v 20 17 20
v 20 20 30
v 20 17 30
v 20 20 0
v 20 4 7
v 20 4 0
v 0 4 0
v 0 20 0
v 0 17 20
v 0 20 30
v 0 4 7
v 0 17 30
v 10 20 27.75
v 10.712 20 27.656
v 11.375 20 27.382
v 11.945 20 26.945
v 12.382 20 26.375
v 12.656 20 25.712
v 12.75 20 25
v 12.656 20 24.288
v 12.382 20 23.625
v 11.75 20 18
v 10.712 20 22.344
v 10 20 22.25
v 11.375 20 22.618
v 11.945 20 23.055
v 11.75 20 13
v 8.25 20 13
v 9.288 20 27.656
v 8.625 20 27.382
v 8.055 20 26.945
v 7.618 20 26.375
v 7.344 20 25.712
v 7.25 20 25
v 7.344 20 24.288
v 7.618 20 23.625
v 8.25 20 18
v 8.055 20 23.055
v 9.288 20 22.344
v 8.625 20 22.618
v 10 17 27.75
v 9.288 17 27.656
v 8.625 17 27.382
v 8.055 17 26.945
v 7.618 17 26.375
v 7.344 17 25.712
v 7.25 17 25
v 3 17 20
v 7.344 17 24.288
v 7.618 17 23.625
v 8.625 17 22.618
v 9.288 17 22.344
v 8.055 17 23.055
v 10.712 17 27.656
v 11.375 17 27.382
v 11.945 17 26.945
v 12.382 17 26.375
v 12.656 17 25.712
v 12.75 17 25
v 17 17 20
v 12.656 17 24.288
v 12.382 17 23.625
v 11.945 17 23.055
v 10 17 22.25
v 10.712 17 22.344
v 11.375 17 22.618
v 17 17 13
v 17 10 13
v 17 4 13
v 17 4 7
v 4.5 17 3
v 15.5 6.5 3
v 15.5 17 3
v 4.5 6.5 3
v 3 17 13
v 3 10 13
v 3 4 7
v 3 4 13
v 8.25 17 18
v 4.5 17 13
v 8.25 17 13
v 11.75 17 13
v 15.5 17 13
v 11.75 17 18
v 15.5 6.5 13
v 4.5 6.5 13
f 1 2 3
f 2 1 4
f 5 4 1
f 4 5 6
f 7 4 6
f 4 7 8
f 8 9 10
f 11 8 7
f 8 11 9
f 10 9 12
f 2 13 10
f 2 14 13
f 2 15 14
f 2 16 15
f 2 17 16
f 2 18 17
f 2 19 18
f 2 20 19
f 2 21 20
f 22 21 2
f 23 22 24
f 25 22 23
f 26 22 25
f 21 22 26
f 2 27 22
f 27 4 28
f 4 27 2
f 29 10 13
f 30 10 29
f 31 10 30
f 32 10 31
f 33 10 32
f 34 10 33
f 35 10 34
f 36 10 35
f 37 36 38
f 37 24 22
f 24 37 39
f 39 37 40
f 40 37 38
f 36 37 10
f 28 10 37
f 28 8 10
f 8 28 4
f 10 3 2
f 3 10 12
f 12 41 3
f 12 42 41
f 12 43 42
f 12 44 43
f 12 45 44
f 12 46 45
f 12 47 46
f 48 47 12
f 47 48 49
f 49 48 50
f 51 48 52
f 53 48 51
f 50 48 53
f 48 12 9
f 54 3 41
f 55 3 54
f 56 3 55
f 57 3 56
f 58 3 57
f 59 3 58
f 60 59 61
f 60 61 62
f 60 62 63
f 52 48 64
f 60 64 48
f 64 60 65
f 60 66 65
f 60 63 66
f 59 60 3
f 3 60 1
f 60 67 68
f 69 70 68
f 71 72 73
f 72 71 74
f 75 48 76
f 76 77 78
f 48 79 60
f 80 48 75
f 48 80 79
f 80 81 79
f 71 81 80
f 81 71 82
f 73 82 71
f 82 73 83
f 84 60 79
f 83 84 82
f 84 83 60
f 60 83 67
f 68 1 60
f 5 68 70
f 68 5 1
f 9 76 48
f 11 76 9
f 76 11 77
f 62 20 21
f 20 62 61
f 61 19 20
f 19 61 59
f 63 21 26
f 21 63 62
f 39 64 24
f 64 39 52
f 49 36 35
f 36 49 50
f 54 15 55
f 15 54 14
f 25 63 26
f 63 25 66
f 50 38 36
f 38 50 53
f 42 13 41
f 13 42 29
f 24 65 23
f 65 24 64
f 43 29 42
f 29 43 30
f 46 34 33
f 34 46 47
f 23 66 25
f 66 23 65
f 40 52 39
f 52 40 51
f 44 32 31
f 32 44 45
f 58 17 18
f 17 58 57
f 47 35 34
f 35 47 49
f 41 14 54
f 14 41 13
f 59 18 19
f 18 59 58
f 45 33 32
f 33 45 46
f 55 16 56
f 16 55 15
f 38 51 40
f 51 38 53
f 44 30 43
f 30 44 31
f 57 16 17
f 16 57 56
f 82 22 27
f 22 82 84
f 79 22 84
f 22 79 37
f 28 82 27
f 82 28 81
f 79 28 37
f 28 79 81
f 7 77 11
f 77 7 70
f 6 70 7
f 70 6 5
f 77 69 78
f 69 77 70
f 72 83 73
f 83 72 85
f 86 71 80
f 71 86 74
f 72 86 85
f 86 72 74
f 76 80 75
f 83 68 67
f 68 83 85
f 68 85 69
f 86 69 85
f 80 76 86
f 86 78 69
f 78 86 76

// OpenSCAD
difference()
{
    union()
    {
        translate([0,0,0])
            cube([20,20,20]);
        translate([0,20-3,20])
            cube([20,3,10]);
    }
        
    union()
    {
        translate([3,0,3])
            cube([14,17,17]);
        
        translate([0,0,3])
            rotate([45,0,0])
                cube([20,(20-3)*sqrt(2),20]);
        
        /*translate([10,17/2,0])
            cylinder(d=5.5,h=3,$fn=24);*/
        
        /*translate([10,17,3+17/2])
            rotate([270,0,0])
                cylinder(d=5.5,h=3,$fn=24);*/
        
        /*translate([10,17,3+17/2])
            rotate([270,0,0])
                cylinder(d=5.5,h=3,$fn=24);*/
        
        translate([10,17,30-5])
            rotate([270,0,0])
                cylinder(d=5.5,h=3,$fn=24);
                
        translate([10-3.5/2,17,3+10])
            cube([3.5,3,5]);
            
        translate([0,0,0])
            cube([20,4,10]);
        
    }
    
}

difference()
{
    translate([3,3,3])
        cube([14,14,10]);
    
    union()
    {
        translate([5-.5,5+2-.5,3])
            cube([11,11,11]);
        
        translate([0,0,0])
            cube([20,4,20]);
    }
}
